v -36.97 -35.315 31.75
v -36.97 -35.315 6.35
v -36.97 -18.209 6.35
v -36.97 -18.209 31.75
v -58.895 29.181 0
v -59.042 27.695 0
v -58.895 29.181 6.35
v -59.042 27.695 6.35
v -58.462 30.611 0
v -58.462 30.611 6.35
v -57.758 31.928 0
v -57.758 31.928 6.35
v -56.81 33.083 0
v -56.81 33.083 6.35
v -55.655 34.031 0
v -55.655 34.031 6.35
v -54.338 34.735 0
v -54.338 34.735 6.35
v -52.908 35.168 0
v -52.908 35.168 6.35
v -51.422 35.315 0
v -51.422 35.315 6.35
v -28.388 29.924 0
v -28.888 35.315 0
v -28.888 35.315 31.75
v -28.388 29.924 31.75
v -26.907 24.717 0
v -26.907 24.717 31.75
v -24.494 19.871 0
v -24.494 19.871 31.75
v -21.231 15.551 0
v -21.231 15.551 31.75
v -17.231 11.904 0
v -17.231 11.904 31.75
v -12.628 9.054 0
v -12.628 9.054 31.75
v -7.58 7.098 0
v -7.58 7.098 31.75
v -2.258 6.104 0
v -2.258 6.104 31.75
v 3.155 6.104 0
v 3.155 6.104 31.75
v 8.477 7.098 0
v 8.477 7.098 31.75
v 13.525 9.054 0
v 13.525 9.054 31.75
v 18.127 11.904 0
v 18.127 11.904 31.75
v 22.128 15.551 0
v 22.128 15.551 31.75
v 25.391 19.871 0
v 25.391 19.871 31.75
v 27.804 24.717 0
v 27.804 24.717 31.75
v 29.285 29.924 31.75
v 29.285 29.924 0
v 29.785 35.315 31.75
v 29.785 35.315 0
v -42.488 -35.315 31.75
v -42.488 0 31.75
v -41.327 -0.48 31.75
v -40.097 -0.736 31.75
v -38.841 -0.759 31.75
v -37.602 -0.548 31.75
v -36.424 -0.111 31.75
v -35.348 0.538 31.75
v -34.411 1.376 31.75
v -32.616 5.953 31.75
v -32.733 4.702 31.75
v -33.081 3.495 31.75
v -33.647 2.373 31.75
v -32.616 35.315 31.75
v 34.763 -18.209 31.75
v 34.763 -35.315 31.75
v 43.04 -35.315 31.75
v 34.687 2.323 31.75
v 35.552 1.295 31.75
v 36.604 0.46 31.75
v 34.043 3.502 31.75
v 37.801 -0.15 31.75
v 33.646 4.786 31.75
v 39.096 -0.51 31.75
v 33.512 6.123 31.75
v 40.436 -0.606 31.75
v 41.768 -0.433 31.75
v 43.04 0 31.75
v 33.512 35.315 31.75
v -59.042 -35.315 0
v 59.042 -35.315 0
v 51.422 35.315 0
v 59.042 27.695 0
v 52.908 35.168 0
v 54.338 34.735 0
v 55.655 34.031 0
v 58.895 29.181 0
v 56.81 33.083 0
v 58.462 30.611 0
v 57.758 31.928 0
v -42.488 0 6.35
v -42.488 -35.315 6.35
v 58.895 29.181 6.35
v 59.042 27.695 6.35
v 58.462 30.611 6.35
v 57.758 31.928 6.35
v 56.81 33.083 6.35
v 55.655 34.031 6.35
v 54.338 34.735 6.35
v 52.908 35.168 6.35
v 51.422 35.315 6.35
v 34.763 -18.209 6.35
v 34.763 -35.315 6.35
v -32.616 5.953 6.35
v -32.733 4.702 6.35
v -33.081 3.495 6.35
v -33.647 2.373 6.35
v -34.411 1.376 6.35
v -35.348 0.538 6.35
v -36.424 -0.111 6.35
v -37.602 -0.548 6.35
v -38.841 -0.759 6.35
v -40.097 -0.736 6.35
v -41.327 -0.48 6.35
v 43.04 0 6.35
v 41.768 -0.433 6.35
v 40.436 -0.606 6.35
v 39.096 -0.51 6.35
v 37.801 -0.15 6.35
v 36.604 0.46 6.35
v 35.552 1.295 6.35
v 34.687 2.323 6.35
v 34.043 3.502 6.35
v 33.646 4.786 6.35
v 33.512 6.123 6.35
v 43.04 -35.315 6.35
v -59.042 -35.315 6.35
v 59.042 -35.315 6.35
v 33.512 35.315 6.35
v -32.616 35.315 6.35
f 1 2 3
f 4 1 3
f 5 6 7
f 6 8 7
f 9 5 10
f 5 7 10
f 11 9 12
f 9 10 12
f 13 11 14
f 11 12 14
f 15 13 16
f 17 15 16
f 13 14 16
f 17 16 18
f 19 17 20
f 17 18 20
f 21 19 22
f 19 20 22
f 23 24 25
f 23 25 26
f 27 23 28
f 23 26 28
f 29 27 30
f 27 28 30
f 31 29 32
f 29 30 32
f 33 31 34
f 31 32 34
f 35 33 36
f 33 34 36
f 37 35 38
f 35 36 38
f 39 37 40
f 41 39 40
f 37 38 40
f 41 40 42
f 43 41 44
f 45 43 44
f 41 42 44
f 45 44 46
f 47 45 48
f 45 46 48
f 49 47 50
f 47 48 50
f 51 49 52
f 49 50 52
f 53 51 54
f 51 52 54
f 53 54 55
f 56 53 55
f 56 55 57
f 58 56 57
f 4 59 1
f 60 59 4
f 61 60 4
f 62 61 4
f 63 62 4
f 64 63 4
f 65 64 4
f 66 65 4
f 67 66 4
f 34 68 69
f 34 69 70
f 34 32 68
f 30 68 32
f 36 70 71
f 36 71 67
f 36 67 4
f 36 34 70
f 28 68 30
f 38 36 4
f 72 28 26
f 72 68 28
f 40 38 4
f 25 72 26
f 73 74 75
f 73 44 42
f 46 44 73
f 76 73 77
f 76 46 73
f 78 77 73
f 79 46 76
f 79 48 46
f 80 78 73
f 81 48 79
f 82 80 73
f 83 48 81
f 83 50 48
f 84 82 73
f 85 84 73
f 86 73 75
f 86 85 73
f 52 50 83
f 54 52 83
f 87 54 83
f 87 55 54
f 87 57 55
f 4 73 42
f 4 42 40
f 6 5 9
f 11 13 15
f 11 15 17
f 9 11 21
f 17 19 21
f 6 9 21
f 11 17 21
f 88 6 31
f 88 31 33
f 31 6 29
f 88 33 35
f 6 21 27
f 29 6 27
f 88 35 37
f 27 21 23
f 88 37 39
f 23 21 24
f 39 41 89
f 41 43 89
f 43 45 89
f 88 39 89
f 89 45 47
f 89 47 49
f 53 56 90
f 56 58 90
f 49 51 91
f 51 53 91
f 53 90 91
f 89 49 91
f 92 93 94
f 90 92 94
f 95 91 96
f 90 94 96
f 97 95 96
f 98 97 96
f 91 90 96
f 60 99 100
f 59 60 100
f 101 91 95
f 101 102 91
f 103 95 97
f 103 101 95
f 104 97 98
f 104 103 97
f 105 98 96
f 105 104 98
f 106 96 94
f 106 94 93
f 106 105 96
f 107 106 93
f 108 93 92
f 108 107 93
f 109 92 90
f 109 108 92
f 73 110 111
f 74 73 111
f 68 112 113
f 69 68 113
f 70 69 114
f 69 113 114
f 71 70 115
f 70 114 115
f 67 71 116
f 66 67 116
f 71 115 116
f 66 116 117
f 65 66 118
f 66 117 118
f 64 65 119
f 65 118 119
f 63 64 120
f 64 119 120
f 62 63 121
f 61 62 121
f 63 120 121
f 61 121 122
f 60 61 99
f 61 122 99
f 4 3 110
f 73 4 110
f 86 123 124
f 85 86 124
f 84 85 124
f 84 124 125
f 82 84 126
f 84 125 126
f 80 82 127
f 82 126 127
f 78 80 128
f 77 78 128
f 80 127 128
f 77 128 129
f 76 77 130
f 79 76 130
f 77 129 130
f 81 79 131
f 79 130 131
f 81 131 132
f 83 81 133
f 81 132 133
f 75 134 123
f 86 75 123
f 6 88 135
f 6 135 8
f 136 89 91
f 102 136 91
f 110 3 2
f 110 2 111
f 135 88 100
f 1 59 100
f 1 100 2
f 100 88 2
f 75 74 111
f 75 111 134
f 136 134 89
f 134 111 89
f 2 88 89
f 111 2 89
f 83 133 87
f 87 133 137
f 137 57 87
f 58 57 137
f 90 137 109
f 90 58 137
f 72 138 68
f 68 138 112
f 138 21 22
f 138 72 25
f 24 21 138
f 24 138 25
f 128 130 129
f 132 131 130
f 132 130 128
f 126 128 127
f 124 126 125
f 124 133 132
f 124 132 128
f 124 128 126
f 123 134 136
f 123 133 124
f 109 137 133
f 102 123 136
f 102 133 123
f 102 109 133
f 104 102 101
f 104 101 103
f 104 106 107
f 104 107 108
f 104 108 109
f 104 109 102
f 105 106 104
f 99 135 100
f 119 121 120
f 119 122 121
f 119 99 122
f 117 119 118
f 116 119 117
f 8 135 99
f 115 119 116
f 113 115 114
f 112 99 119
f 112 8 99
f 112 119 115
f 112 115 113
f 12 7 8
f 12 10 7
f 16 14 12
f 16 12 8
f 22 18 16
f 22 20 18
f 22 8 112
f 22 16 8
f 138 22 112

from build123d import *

# Parameters (mm, degrees)
F0_W     = 118.0837154388
F0_H     = 70.6295147538
F1_DEPTH = 6.35
F2_R     = 7.62
F4_DEPTH = 25.4
F6_DEPTH = 50.8


with BuildPart() as f1:
    # F0 (on Top) → F1 (new body)
    with BuildSketch(Plane.XY):
        Rectangle(F0_W, F0_H)
    extrude(amount=F1_DEPTH)

    # F2
    f2_edges = [f1.edges().sort_by_distance(p)[0] for p in [
        (-59.041858, 35.314757, 3.175),
        (59.041858, 35.314757, 3.175),
    ]]
    fillet(f2_edges, radius=F2_R)

    # F3 (on face) → F4 (join)
    with BuildSketch(Plane.XY.offset(6.35)):
        with BuildLine():
            Line((-42.4880945322, 0), (-42.4880945322, -35.3147573769))
            Line((-42.4880945322, -35.3147573769), (-36.9701385498, -35.3147573769))
            Line((-36.9701385498, -35.3147573769), (-36.9701385498, -18.2091724128))
            Line((-36.9701385498, -18.2091724128), (34.7629673779, -18.2091724128))
            Line((34.7629673779, -18.2091724128), (34.7629673779, -35.3147573769))
            Line((34.7629673779, -35.3147573769), (43.0398620665, -35.3147573769))
            Line((43.0398620665, -35.3147573769), (43.0398620665, 0))
            ThreePointArc((43.0398620665, 0), (36.6044160593, 0.4599269685), (33.5122679292, 6.1225339714))
            Line((33.5122679292, 6.1225339714), (33.5122679292, 35.3147573769))
            Line((33.5122679292, 35.3147573769), (-32.6155844176, 35.3147573769))
            Line((-32.6155844176, 35.3147573769), (-32.6155844176, 5.9529215684))
            ThreePointArc((-32.6155844176, 5.9529215684), (-35.8708933771, 0.1887275405), (-42.4880945322, 0))
        make_face()
    extrude(amount=F4_DEPTH)

    # F5 (on face) → F6 (cut)
    with BuildSketch(Plane.XY.offset(31.75)):
        with BuildLine():
            ThreePointArc((-28.8878973408, 35.3147573769), (0.4483417558, 5.9785182804), (29.7845808524, 35.3147573769))
            Line((29.7845808524, 35.3147573769), (-28.8878973408, 35.3147573769))
        make_face()
    extrude(amount=-F6_DEPTH, mode=Mode.SUBTRACT)


solid = f1.part
